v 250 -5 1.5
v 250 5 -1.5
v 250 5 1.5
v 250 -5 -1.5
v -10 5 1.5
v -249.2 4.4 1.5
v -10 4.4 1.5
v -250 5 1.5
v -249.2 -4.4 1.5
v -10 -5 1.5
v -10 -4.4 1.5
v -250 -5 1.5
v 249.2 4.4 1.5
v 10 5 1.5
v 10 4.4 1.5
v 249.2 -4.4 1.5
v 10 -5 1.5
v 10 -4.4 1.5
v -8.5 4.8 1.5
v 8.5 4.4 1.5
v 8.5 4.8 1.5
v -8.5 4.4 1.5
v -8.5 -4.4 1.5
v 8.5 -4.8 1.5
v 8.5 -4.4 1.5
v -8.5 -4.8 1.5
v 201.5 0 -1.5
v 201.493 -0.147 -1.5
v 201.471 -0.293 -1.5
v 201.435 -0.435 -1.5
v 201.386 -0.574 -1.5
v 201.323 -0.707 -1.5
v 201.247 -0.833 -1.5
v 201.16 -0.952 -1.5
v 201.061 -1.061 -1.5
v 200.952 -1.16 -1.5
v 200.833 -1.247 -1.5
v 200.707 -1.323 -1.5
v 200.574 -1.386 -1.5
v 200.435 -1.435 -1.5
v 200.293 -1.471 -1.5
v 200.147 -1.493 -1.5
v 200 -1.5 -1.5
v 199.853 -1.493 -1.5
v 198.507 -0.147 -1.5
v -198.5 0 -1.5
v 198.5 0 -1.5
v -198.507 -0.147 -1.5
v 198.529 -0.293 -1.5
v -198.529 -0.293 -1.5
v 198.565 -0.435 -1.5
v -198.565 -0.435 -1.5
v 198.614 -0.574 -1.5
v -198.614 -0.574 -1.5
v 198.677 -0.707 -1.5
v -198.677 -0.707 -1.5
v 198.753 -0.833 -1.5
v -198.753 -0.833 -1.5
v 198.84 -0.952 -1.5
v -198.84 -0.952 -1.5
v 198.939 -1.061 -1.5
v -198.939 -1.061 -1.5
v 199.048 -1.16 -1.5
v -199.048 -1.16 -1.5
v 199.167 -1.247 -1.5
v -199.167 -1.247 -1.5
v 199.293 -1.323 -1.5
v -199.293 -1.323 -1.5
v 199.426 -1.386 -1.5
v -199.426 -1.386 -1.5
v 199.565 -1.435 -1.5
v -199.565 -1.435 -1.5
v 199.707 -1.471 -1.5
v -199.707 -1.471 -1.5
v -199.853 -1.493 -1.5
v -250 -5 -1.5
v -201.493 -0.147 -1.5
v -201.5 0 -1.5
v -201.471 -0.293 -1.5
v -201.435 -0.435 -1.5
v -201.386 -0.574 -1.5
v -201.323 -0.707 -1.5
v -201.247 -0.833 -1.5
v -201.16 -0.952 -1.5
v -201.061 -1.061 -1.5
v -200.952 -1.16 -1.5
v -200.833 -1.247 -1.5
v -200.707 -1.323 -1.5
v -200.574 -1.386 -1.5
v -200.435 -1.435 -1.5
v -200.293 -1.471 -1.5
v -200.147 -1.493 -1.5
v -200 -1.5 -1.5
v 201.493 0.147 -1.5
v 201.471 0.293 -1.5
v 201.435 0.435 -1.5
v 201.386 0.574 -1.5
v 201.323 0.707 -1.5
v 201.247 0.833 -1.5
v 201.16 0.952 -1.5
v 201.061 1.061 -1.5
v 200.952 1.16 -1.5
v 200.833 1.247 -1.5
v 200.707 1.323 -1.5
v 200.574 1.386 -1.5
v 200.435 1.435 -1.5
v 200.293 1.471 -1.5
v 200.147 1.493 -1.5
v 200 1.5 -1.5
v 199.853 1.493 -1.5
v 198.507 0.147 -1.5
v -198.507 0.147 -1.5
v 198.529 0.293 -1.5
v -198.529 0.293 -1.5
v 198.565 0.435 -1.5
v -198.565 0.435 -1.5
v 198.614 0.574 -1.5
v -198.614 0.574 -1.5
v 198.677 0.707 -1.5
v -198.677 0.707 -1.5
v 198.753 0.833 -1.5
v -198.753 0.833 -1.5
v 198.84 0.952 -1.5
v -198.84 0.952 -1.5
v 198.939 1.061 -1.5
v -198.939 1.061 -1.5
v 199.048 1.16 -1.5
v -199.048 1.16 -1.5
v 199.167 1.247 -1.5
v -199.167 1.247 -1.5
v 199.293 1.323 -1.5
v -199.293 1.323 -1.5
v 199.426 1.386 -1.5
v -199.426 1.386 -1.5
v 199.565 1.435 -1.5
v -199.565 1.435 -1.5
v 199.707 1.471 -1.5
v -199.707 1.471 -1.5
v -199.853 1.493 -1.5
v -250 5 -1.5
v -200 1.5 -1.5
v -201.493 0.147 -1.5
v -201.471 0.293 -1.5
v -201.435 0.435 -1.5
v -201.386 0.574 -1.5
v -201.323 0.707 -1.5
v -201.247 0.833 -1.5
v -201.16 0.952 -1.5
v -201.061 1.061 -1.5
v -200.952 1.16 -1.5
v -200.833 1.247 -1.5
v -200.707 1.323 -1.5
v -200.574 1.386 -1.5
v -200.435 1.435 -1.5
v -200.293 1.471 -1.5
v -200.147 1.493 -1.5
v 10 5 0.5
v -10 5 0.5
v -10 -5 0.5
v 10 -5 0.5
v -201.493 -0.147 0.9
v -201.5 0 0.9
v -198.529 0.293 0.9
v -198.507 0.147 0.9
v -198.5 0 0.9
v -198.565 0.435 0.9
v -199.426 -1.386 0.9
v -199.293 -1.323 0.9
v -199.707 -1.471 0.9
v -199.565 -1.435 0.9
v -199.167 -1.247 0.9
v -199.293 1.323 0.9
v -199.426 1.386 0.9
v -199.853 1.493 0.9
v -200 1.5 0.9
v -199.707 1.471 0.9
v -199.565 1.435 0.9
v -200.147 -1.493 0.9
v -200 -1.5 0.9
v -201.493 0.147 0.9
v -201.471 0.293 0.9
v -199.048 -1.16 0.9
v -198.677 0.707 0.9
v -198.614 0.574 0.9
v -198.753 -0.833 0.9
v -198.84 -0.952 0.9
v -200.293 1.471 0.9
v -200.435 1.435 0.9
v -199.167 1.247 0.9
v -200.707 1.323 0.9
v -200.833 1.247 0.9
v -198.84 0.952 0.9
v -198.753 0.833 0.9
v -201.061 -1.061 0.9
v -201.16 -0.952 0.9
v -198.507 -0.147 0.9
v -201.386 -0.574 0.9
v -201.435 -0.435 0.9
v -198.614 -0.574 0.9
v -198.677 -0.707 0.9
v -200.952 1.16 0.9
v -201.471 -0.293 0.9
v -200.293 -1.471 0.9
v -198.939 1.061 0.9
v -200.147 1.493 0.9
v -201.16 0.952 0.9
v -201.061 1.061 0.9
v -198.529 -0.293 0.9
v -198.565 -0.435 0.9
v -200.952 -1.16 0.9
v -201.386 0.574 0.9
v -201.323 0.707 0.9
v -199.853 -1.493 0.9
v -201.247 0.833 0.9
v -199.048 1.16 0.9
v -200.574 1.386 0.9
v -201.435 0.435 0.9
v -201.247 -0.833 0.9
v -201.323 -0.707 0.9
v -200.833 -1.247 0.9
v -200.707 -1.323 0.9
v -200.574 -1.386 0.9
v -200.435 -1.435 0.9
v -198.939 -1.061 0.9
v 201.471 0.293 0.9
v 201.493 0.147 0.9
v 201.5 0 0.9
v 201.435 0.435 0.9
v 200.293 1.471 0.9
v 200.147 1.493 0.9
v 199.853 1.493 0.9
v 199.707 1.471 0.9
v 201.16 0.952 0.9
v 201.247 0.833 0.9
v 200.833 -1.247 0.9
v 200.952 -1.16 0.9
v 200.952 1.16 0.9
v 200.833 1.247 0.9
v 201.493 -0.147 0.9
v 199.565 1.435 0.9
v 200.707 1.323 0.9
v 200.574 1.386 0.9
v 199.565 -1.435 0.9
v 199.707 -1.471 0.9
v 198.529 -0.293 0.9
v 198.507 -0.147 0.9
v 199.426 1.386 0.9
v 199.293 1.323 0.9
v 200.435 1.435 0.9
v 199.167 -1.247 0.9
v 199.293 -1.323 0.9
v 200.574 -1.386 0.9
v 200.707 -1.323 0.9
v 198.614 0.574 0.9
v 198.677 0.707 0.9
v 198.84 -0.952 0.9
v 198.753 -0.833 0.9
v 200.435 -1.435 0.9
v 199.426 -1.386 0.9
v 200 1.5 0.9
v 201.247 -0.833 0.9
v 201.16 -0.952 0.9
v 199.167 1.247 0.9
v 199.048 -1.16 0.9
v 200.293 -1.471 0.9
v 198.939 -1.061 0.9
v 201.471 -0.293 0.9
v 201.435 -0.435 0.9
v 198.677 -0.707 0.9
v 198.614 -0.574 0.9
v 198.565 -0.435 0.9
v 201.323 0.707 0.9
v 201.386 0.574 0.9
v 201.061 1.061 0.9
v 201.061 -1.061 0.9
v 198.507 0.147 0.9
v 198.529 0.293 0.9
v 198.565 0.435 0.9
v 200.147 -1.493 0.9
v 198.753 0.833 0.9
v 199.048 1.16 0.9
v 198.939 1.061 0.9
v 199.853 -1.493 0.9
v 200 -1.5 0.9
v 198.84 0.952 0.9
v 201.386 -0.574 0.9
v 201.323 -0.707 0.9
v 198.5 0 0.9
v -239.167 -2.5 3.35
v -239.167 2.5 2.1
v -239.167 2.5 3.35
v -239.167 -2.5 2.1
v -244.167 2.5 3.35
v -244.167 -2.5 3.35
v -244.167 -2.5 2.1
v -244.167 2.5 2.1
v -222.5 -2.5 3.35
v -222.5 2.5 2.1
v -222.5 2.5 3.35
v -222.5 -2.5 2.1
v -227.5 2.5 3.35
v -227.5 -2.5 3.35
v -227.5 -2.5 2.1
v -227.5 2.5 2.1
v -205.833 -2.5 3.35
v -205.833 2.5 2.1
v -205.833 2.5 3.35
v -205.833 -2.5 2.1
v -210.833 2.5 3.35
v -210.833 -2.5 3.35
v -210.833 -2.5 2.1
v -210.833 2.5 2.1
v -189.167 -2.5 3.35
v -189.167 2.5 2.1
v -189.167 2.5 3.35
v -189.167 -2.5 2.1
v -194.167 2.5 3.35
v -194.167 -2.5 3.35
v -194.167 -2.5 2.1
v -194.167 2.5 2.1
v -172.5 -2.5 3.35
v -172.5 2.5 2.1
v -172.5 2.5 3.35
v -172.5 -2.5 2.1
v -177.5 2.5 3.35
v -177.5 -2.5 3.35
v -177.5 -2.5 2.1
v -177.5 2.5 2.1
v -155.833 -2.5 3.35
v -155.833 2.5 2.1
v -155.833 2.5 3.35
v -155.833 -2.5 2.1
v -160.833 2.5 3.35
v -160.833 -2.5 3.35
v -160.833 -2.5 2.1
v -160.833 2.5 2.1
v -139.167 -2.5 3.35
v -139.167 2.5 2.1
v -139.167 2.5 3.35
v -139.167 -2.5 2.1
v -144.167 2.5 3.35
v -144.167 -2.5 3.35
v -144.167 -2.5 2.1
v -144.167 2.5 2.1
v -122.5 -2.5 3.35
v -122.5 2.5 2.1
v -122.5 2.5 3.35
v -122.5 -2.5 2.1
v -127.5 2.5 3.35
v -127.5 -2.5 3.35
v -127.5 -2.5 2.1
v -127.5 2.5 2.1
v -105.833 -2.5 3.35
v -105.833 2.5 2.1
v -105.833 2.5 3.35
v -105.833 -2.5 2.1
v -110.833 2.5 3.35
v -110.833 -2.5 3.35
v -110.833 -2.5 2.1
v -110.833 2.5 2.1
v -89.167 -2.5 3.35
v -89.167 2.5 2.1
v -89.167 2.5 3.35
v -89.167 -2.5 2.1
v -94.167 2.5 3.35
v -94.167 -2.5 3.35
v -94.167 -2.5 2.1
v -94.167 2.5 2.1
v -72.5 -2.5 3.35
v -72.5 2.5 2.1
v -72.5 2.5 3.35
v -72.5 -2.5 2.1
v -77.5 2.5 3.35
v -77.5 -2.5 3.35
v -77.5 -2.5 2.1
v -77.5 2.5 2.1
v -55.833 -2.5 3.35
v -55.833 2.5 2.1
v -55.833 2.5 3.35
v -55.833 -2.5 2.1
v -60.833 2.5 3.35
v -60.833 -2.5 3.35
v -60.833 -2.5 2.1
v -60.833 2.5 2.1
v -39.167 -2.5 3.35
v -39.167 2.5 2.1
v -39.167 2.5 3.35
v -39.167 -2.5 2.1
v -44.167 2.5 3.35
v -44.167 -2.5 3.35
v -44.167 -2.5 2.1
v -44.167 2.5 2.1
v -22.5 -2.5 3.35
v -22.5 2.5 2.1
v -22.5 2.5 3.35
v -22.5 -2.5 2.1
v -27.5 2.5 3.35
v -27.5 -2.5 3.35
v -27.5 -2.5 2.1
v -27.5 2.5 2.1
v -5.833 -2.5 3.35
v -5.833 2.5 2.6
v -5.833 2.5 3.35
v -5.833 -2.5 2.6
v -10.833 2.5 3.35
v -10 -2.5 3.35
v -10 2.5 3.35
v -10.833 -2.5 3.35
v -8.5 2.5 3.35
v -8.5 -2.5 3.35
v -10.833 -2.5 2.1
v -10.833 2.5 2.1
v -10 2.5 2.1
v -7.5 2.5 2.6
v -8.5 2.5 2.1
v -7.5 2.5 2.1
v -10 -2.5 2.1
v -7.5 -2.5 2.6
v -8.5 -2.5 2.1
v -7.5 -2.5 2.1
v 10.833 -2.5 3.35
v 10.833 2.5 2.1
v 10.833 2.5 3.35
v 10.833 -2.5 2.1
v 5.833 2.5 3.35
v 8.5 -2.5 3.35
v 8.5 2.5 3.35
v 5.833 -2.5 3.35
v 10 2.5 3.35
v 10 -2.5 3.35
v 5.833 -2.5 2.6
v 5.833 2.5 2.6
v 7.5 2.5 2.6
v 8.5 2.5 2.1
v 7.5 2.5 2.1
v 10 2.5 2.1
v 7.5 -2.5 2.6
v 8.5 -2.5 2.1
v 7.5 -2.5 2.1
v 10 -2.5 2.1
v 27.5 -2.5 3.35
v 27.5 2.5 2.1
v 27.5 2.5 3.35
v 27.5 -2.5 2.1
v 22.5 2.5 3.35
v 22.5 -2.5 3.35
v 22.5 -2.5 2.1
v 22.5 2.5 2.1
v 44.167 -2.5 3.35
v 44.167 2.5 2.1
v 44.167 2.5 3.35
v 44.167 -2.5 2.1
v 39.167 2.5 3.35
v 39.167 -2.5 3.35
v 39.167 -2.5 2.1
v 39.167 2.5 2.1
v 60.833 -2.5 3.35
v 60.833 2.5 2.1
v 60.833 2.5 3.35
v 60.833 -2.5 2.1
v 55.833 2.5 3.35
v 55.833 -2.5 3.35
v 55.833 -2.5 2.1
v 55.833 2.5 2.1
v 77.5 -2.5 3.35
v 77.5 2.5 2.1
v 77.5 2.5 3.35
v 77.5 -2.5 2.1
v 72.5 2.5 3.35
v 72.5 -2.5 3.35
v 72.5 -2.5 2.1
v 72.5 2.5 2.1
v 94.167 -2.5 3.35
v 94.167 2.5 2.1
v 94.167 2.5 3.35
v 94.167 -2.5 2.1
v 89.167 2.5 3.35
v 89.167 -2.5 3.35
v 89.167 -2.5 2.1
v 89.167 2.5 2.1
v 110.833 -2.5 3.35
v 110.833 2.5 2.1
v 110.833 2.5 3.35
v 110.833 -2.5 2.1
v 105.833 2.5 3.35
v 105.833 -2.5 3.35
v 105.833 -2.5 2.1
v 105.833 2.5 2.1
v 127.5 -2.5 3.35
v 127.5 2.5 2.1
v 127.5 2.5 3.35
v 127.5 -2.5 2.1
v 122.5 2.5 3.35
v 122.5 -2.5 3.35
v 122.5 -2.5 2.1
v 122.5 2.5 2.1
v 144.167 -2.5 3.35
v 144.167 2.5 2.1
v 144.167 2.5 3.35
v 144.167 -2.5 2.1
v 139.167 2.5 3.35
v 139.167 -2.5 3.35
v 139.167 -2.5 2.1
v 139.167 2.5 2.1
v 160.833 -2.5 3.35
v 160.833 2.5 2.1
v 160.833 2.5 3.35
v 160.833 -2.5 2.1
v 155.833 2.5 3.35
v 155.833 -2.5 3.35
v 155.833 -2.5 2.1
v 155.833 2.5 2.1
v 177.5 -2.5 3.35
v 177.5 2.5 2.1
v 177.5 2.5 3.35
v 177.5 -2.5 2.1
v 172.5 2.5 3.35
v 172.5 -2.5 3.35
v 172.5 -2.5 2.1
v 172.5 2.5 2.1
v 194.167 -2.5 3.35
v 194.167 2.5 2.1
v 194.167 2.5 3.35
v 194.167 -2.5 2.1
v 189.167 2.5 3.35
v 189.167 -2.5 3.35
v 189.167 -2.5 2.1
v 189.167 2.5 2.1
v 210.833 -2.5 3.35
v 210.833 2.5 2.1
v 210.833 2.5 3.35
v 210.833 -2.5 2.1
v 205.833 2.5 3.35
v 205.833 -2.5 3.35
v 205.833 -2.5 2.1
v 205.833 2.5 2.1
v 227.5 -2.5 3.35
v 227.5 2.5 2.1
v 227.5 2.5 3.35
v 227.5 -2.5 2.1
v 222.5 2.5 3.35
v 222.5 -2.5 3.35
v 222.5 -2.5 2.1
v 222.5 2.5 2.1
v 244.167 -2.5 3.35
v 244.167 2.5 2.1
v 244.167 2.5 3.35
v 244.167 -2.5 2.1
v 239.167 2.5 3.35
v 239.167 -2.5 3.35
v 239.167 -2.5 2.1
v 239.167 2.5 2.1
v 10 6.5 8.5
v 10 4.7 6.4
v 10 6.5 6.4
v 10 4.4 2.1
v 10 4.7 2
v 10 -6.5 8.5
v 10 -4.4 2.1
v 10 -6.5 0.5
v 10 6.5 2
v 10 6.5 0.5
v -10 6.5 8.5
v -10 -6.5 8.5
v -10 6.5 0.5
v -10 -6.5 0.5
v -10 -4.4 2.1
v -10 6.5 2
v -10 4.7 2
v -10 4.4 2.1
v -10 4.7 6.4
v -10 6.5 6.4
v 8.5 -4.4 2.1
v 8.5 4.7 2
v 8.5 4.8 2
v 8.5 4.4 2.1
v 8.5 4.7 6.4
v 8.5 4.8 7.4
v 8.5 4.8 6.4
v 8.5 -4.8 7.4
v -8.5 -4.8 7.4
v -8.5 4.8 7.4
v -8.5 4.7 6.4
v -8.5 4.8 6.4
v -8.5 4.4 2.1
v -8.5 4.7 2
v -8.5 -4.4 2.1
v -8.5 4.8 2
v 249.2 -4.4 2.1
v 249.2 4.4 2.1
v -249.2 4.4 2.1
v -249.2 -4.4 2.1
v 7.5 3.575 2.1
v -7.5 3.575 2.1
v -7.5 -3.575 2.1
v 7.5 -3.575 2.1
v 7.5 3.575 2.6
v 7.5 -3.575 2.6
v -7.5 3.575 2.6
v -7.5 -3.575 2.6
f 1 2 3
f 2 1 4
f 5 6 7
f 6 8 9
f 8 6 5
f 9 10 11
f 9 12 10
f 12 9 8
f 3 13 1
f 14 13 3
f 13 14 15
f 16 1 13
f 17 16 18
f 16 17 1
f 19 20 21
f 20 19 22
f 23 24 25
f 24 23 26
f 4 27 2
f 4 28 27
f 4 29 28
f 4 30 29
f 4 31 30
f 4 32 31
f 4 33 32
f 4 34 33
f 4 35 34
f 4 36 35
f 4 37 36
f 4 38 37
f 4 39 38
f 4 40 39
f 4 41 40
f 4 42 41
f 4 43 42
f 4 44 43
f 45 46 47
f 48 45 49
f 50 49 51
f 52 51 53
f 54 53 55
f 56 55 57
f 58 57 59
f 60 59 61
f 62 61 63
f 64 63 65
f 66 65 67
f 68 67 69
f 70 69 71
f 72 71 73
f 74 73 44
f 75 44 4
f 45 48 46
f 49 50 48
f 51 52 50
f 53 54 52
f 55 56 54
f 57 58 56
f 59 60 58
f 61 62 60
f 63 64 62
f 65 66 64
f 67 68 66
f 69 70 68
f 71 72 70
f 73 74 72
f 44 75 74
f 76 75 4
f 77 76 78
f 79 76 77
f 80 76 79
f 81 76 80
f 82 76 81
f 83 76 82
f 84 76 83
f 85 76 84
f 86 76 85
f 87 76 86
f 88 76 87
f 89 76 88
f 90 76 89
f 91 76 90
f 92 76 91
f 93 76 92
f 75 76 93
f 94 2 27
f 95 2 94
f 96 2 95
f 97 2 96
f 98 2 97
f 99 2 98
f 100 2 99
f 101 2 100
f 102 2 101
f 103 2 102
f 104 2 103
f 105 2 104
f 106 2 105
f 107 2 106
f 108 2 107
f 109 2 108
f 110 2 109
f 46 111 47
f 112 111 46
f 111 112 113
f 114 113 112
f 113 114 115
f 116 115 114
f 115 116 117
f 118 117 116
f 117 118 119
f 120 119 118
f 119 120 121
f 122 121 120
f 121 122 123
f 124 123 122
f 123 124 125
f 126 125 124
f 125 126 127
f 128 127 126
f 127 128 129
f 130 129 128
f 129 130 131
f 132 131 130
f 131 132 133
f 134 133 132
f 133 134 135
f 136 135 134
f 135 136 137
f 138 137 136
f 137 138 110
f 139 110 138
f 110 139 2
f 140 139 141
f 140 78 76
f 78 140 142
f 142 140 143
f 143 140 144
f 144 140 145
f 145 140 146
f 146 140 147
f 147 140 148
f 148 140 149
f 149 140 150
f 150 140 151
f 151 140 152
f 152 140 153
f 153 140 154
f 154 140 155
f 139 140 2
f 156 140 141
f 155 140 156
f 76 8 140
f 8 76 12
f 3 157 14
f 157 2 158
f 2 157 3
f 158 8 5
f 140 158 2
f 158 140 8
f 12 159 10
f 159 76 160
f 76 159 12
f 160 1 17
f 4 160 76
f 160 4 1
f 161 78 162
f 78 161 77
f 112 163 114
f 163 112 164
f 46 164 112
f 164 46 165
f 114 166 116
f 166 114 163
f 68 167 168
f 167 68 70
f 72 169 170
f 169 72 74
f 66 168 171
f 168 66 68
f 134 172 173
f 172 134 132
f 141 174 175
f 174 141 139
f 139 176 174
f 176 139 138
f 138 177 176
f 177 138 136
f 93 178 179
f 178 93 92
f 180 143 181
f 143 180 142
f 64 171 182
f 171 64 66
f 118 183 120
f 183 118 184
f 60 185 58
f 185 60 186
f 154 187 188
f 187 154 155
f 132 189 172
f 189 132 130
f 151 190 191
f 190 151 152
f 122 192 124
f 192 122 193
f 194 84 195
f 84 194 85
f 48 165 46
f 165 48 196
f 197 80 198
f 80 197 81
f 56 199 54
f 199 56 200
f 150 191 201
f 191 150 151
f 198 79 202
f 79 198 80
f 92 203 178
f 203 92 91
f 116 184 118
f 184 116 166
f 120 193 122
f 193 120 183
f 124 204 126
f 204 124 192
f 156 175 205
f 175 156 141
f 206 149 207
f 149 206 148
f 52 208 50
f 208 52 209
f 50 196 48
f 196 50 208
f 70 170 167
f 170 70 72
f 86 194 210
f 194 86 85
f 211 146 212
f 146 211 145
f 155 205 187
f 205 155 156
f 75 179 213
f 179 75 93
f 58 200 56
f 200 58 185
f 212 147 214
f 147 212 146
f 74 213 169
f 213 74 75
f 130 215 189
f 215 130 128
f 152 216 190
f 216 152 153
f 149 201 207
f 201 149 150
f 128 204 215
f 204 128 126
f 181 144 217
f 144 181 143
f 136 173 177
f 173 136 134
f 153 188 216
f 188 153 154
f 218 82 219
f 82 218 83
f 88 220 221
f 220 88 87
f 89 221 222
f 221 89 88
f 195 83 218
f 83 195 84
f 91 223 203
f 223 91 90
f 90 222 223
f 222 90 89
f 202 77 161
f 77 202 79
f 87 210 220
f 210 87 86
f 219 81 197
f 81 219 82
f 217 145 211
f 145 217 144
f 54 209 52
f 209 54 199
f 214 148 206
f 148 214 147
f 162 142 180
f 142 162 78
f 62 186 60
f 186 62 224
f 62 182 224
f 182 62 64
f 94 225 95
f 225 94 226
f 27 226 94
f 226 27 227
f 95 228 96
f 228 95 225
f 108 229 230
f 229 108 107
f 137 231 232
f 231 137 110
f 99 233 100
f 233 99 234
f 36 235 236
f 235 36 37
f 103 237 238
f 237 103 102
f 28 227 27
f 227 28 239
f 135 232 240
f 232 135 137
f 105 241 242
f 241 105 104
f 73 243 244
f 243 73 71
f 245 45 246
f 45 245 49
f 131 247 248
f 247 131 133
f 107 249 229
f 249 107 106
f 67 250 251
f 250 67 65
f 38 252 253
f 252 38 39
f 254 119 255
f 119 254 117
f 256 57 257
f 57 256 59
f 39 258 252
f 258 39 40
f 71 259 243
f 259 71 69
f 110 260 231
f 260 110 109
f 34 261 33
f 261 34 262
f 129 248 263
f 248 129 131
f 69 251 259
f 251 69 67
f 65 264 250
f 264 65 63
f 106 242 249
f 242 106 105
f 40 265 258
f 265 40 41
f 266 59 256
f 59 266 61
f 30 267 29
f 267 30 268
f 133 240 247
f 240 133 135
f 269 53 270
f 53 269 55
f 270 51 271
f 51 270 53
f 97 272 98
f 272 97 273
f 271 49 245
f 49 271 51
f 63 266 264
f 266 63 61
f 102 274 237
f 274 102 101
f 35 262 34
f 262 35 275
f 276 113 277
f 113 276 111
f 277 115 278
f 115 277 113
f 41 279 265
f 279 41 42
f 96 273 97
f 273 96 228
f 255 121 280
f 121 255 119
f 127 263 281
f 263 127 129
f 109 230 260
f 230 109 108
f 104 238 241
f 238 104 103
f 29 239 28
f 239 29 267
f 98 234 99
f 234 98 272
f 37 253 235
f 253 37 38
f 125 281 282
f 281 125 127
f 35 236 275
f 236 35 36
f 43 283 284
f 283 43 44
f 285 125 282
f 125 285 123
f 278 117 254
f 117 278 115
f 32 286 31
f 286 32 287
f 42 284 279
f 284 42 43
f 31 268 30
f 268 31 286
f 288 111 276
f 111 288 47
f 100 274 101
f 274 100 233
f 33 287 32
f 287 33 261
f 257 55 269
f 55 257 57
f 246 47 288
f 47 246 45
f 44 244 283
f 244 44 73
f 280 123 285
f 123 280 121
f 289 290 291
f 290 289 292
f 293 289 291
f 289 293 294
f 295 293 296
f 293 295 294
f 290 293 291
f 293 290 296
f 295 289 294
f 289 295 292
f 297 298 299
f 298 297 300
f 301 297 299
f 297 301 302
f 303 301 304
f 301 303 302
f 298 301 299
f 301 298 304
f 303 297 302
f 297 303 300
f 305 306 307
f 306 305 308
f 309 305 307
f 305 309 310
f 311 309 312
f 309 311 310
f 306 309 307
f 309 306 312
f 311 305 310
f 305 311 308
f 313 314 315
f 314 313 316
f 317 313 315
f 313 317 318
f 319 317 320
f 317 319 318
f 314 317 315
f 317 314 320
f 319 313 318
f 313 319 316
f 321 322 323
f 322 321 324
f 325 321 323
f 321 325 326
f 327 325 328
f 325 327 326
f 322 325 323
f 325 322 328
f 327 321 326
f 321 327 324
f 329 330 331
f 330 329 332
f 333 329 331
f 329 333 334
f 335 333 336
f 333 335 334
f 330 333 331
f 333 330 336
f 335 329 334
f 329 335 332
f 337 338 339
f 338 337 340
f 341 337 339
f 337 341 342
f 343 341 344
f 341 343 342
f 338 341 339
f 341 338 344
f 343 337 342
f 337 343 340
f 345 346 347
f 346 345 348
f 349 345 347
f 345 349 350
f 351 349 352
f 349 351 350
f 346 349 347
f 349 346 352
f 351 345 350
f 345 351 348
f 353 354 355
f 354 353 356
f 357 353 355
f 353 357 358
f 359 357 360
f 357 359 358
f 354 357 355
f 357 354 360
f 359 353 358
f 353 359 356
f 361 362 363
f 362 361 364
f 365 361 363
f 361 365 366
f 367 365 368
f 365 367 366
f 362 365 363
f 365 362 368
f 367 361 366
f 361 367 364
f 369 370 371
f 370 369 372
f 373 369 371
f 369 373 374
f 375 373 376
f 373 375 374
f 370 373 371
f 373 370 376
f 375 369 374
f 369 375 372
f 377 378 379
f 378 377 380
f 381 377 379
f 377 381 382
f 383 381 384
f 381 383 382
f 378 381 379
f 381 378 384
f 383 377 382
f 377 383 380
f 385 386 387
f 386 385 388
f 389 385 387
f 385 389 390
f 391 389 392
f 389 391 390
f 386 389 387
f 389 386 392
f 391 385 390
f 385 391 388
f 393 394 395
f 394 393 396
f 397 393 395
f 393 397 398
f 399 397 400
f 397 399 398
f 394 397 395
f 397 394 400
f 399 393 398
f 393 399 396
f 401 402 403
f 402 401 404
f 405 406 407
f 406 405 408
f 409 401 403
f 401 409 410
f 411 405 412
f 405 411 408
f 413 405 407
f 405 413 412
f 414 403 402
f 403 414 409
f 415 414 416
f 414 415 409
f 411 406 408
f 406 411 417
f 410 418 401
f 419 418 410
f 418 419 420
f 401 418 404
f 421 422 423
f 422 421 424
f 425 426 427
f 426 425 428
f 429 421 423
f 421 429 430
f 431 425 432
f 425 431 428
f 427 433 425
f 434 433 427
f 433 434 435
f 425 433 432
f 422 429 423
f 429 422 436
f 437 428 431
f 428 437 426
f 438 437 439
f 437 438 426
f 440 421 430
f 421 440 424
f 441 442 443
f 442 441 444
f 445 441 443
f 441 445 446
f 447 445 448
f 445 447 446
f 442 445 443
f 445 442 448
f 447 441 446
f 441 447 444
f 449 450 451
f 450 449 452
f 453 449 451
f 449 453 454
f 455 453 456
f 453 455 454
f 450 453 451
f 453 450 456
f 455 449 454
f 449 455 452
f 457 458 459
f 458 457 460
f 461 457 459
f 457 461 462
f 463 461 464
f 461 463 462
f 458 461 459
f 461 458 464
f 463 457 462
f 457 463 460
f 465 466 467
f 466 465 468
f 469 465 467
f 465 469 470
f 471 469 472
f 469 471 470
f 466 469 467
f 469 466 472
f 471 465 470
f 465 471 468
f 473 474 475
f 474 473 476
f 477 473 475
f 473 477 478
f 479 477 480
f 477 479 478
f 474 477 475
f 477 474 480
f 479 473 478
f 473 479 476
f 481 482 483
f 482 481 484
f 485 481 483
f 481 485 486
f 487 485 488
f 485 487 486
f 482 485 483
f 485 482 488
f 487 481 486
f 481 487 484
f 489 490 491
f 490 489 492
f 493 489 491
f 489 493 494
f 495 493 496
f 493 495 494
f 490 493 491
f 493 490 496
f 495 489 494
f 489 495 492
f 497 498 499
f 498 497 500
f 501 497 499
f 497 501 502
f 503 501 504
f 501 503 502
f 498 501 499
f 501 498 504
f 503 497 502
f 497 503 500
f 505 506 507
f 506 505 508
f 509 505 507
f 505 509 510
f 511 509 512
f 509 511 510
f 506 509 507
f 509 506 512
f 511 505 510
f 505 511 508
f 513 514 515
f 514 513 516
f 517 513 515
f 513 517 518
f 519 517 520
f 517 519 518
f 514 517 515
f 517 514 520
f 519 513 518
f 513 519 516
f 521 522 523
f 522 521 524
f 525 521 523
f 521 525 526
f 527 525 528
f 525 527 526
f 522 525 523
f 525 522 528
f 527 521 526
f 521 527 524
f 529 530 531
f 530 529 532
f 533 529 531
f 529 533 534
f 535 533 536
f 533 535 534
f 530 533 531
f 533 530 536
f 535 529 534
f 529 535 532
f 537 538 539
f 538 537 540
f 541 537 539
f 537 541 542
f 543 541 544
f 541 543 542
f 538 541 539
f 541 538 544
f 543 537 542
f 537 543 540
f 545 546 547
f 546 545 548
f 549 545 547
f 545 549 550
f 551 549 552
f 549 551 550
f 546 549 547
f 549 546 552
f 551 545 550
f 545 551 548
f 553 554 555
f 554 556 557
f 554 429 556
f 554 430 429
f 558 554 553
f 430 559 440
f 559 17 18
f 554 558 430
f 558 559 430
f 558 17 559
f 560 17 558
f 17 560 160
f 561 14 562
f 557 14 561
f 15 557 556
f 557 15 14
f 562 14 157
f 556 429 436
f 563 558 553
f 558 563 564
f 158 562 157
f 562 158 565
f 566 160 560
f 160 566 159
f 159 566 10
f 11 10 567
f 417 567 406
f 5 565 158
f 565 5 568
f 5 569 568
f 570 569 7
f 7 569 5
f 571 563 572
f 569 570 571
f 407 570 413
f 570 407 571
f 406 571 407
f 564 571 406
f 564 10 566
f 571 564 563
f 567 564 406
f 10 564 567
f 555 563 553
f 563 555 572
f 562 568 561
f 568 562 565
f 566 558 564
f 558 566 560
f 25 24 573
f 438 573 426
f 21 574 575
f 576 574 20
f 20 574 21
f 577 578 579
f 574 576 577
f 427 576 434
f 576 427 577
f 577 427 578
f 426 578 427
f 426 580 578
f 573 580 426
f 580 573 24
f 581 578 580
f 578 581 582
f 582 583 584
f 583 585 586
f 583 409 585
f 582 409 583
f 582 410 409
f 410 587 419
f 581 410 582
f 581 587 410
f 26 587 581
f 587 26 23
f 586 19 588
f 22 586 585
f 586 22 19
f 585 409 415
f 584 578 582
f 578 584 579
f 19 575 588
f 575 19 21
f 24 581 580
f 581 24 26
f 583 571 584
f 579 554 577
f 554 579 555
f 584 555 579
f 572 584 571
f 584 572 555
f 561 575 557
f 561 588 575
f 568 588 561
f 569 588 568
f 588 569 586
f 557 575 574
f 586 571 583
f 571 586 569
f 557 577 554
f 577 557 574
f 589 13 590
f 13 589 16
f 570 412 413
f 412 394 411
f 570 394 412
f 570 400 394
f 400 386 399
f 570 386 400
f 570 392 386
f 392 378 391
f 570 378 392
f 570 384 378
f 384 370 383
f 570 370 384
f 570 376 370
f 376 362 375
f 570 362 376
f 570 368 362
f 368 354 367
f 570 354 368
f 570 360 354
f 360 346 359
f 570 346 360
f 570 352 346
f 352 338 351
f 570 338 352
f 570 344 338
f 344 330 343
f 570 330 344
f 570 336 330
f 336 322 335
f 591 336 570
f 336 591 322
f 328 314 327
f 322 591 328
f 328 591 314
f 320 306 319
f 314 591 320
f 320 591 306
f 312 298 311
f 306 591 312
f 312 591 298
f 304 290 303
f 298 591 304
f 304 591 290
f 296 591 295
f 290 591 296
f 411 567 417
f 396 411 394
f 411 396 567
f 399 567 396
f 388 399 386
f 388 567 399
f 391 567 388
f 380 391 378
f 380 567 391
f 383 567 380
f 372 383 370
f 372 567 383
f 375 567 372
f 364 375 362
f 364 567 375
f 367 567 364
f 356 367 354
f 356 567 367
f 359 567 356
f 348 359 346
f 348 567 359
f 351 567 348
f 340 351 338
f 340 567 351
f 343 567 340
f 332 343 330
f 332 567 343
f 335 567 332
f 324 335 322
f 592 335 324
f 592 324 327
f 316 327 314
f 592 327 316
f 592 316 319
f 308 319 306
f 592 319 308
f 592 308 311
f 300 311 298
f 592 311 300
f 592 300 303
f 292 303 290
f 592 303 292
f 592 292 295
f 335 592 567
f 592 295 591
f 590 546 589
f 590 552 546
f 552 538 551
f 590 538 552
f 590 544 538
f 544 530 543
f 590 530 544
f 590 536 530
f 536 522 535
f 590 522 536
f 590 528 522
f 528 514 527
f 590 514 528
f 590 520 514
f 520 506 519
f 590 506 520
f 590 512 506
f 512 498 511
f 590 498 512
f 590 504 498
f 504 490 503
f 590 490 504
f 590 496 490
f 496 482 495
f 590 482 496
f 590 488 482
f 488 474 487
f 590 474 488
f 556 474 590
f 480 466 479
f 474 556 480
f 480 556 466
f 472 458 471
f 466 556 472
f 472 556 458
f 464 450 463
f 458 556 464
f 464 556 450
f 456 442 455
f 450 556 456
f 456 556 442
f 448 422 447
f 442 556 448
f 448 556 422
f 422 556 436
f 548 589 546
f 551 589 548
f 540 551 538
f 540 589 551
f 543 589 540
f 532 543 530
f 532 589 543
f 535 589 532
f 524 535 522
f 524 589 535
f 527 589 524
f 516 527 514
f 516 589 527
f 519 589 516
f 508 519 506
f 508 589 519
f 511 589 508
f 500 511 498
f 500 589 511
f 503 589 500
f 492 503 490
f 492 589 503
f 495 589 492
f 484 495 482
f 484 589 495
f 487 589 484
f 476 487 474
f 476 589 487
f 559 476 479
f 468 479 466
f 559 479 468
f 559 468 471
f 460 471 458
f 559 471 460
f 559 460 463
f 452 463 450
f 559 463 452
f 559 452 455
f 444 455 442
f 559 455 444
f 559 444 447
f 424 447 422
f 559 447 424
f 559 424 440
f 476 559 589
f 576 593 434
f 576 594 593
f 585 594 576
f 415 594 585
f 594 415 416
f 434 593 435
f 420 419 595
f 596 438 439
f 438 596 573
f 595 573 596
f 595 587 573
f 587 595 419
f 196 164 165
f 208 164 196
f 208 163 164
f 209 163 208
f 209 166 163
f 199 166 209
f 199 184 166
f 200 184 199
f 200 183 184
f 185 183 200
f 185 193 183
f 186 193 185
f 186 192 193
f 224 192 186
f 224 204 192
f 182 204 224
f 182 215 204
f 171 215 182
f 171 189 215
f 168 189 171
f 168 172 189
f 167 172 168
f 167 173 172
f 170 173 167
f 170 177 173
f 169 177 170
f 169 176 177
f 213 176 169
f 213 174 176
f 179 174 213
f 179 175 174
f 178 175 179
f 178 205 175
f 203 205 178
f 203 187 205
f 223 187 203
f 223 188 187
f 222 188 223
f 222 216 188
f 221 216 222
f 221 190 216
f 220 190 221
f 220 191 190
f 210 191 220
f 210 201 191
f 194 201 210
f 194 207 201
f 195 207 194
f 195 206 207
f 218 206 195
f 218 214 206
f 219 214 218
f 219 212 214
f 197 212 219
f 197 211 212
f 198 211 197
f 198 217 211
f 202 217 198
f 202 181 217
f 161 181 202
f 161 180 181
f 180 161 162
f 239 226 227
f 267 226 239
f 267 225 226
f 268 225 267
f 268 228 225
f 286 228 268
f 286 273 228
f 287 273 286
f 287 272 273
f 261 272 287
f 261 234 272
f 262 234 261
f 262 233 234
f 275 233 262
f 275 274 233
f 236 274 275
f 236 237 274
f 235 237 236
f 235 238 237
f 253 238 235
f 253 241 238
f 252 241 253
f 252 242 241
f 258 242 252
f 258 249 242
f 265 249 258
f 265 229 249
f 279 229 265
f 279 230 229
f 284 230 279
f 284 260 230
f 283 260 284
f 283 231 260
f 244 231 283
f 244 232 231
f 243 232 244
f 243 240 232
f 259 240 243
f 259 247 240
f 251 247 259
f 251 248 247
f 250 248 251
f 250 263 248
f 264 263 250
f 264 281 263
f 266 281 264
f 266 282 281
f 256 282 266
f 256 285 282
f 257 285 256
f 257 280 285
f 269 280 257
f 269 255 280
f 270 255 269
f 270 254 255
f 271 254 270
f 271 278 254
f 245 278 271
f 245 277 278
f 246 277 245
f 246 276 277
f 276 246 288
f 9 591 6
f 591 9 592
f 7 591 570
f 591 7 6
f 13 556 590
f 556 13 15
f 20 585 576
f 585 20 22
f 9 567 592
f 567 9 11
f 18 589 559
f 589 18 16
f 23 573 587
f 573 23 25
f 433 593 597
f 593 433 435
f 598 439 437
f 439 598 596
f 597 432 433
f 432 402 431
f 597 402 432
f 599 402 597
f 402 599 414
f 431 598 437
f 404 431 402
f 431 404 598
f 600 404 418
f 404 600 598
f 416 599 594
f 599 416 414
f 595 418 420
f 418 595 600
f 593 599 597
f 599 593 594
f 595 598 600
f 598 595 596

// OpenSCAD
// Parameters
strip_length = 500; //[250:1000:1]
strip_width = 10; //[5:20:1]
strip_thickness = 2; //[1:4:0.1]
pcb_thickness = 1.6; //[0.8:3.2:0.1]
led_count = 30; //[6:120:1]
segment_count = 10; //[2:40:1]
led_package_size = 5; //[3:8:0.1]
mounting_hole_diameter = 3; //[2:6:0.1]
mounting_hole_spacing = 100; //[50:200:1]
eps = 0.8; //[0.2:2:0.1]
copper_thickness = 0.15; //[0.05:0.4:0.01]
solder_pad_length = 2.5; //[1.5:5:0.1]
solder_pad_width = 2.5; //[1.5:5:0.1]
segment_mark_width = 0.3; //[0.1:1:0.05]
segment_mark_height = 0.1; //[0.05:0.3:0.01]
resistor_length = 3.2; //[2:6:0.1]
resistor_width = 1.5; //[1:3:0.1]
resistor_height = 0.6; //[0.3:1.5:0.05]
lens_height = 0.8; //[0.3:2:0.1]
lens_width_margin = 0.6; //[0.2:2:0.1]
clip_length = 20; //[10:60:1]
clip_wall = 1.5; //[0.8:3:0.1]
clip_depth = 8; //[4:20:1]
clip_clearance = 0.4; //[0.1:1:0.05]
clip_attach_x = 0; //[-200:200:1]

$fn = 64;

// Helpers
function clamp(v, lo, hi) = v < lo ? lo : (v > hi ? hi : v);

module assembly() {

  // Make the strip clearly visible in all views (avoid "paper thin" look)
  strip_t = max(strip_thickness, 3.0);
  lens_h  = max(lens_height, 1.2);

  // Clip sizing (robust)
  clip_L = max(clip_length, 12);
  clip_W = strip_width + 2*max(clip_wall, 1.2);
  clip_D = max(clip_depth, 8);

  wall   = max(clip_wall, 1.2);
  clear  = max(clip_clearance, 0.25);

  // Slot (where strip slides in)
  slot_W = min(strip_width + 2*clear, clip_W - 2*wall - 0.4);
  slot_D = max(clip_D - 2*wall, 2.0);
  slot_L = max(clip_L - 2*wall, 6.0);

  // Place clip on top of strip (Z+), centered in Y, with guaranteed overlap into strip
  overlap_z = 1.0; // ensures one connected solid
  z_strip_top = strip_t/2;
  z_clip_center = z_strip_top + clip_D/2 - overlap_z;

  // Add a small base foot under the clip to make the mount feature obvious and connected
  foot_L = clip_L * 0.75;
  foot_W = clip_W * 0.55;
  foot_T = max(2.0, strip_t * 0.7);
  z_foot_center = z_strip_top + foot_T/2 - overlap_z;

  union() {

    // Main rigid strip with mounting holes
    difference() {
      cube([strip_length, strip_width, strip_t], center=true);

      hole_x1 = clamp(-strip_length/2 + mounting_hole_spacing/2,
                      -strip_length/2 + 12, strip_length/2 - 12);
      hole_x2 = clamp( strip_length/2 - mounting_hole_spacing/2,
                      -strip_length/2 + 12, strip_length/2 - 12);

      translate([hole_x1, 0, 0])
        cylinder(h=strip_t + 2*eps, r=mounting_hole_diameter/2, center=true);

      translate([hole_x2, 0, 0])
        cylinder(h=strip_t + 2*eps, r=mounting_hole_diameter/2, center=true);
    }

    // Raised diffuser/lens (thicker for readability)
    lens_W = max(strip_width - 2*lens_width_margin, strip_width*0.6);
    translate([0, 0, z_strip_top + lens_h/2 - 0.6]) // overlap into strip
      cube([strip_length - 2*eps, lens_W, lens_h], center=true);

    // LED packages as bumps
    led_pitch = strip_length / max(led_count, 1);
    led_h = max(led_package_size*0.45, 1.4);
    led_w = min(max(led_package_size, 3.0), strip_width - 1.0);
    led_l = min(max(led_package_size, 3.0), led_pitch*0.75);

    for (i = [0:led_count-1]) {
      x = -strip_length/2 + led_pitch*(i + 0.5);
      translate([x, 0, z_strip_top + led_h/2 - 0.4]) // overlap into strip
        cube([led_l, led_w, led_h], center=true);
    }

    // Clip foot (solid, connected)
    translate([clip_attach_x, 0, z_foot_center])
      cube([foot_L, foot_W, foot_T], center=true);

    // Clip body with U-slot (no "window" that deletes the whole clip)
    translate([clip_attach_x, 0, z_clip_center])
      difference() {
        cube([clip_L, clip_W, clip_D], center=true);

        // Slot cavity: open from bottom by extending cut downward
        translate([0, 0, -wall/2])
          cube([slot_L, slot_W, slot_D + wall + eps], center=true);

        // Side entry notch (small) to suggest clip opening without removing everything
        notch_W = min(slot_W, clip_W - 2*wall);
        notch_H = clip_D * 0.55;
        notch_T = max(wall + 0.6, 1.6);
        translate([0, clip_W/2 - wall/2, -clip_D/2 + notch_H/2 + wall])
          cube([clip_L + 2*eps, notch_T, notch_H], center=true);
      }
  }
}

assembly();
